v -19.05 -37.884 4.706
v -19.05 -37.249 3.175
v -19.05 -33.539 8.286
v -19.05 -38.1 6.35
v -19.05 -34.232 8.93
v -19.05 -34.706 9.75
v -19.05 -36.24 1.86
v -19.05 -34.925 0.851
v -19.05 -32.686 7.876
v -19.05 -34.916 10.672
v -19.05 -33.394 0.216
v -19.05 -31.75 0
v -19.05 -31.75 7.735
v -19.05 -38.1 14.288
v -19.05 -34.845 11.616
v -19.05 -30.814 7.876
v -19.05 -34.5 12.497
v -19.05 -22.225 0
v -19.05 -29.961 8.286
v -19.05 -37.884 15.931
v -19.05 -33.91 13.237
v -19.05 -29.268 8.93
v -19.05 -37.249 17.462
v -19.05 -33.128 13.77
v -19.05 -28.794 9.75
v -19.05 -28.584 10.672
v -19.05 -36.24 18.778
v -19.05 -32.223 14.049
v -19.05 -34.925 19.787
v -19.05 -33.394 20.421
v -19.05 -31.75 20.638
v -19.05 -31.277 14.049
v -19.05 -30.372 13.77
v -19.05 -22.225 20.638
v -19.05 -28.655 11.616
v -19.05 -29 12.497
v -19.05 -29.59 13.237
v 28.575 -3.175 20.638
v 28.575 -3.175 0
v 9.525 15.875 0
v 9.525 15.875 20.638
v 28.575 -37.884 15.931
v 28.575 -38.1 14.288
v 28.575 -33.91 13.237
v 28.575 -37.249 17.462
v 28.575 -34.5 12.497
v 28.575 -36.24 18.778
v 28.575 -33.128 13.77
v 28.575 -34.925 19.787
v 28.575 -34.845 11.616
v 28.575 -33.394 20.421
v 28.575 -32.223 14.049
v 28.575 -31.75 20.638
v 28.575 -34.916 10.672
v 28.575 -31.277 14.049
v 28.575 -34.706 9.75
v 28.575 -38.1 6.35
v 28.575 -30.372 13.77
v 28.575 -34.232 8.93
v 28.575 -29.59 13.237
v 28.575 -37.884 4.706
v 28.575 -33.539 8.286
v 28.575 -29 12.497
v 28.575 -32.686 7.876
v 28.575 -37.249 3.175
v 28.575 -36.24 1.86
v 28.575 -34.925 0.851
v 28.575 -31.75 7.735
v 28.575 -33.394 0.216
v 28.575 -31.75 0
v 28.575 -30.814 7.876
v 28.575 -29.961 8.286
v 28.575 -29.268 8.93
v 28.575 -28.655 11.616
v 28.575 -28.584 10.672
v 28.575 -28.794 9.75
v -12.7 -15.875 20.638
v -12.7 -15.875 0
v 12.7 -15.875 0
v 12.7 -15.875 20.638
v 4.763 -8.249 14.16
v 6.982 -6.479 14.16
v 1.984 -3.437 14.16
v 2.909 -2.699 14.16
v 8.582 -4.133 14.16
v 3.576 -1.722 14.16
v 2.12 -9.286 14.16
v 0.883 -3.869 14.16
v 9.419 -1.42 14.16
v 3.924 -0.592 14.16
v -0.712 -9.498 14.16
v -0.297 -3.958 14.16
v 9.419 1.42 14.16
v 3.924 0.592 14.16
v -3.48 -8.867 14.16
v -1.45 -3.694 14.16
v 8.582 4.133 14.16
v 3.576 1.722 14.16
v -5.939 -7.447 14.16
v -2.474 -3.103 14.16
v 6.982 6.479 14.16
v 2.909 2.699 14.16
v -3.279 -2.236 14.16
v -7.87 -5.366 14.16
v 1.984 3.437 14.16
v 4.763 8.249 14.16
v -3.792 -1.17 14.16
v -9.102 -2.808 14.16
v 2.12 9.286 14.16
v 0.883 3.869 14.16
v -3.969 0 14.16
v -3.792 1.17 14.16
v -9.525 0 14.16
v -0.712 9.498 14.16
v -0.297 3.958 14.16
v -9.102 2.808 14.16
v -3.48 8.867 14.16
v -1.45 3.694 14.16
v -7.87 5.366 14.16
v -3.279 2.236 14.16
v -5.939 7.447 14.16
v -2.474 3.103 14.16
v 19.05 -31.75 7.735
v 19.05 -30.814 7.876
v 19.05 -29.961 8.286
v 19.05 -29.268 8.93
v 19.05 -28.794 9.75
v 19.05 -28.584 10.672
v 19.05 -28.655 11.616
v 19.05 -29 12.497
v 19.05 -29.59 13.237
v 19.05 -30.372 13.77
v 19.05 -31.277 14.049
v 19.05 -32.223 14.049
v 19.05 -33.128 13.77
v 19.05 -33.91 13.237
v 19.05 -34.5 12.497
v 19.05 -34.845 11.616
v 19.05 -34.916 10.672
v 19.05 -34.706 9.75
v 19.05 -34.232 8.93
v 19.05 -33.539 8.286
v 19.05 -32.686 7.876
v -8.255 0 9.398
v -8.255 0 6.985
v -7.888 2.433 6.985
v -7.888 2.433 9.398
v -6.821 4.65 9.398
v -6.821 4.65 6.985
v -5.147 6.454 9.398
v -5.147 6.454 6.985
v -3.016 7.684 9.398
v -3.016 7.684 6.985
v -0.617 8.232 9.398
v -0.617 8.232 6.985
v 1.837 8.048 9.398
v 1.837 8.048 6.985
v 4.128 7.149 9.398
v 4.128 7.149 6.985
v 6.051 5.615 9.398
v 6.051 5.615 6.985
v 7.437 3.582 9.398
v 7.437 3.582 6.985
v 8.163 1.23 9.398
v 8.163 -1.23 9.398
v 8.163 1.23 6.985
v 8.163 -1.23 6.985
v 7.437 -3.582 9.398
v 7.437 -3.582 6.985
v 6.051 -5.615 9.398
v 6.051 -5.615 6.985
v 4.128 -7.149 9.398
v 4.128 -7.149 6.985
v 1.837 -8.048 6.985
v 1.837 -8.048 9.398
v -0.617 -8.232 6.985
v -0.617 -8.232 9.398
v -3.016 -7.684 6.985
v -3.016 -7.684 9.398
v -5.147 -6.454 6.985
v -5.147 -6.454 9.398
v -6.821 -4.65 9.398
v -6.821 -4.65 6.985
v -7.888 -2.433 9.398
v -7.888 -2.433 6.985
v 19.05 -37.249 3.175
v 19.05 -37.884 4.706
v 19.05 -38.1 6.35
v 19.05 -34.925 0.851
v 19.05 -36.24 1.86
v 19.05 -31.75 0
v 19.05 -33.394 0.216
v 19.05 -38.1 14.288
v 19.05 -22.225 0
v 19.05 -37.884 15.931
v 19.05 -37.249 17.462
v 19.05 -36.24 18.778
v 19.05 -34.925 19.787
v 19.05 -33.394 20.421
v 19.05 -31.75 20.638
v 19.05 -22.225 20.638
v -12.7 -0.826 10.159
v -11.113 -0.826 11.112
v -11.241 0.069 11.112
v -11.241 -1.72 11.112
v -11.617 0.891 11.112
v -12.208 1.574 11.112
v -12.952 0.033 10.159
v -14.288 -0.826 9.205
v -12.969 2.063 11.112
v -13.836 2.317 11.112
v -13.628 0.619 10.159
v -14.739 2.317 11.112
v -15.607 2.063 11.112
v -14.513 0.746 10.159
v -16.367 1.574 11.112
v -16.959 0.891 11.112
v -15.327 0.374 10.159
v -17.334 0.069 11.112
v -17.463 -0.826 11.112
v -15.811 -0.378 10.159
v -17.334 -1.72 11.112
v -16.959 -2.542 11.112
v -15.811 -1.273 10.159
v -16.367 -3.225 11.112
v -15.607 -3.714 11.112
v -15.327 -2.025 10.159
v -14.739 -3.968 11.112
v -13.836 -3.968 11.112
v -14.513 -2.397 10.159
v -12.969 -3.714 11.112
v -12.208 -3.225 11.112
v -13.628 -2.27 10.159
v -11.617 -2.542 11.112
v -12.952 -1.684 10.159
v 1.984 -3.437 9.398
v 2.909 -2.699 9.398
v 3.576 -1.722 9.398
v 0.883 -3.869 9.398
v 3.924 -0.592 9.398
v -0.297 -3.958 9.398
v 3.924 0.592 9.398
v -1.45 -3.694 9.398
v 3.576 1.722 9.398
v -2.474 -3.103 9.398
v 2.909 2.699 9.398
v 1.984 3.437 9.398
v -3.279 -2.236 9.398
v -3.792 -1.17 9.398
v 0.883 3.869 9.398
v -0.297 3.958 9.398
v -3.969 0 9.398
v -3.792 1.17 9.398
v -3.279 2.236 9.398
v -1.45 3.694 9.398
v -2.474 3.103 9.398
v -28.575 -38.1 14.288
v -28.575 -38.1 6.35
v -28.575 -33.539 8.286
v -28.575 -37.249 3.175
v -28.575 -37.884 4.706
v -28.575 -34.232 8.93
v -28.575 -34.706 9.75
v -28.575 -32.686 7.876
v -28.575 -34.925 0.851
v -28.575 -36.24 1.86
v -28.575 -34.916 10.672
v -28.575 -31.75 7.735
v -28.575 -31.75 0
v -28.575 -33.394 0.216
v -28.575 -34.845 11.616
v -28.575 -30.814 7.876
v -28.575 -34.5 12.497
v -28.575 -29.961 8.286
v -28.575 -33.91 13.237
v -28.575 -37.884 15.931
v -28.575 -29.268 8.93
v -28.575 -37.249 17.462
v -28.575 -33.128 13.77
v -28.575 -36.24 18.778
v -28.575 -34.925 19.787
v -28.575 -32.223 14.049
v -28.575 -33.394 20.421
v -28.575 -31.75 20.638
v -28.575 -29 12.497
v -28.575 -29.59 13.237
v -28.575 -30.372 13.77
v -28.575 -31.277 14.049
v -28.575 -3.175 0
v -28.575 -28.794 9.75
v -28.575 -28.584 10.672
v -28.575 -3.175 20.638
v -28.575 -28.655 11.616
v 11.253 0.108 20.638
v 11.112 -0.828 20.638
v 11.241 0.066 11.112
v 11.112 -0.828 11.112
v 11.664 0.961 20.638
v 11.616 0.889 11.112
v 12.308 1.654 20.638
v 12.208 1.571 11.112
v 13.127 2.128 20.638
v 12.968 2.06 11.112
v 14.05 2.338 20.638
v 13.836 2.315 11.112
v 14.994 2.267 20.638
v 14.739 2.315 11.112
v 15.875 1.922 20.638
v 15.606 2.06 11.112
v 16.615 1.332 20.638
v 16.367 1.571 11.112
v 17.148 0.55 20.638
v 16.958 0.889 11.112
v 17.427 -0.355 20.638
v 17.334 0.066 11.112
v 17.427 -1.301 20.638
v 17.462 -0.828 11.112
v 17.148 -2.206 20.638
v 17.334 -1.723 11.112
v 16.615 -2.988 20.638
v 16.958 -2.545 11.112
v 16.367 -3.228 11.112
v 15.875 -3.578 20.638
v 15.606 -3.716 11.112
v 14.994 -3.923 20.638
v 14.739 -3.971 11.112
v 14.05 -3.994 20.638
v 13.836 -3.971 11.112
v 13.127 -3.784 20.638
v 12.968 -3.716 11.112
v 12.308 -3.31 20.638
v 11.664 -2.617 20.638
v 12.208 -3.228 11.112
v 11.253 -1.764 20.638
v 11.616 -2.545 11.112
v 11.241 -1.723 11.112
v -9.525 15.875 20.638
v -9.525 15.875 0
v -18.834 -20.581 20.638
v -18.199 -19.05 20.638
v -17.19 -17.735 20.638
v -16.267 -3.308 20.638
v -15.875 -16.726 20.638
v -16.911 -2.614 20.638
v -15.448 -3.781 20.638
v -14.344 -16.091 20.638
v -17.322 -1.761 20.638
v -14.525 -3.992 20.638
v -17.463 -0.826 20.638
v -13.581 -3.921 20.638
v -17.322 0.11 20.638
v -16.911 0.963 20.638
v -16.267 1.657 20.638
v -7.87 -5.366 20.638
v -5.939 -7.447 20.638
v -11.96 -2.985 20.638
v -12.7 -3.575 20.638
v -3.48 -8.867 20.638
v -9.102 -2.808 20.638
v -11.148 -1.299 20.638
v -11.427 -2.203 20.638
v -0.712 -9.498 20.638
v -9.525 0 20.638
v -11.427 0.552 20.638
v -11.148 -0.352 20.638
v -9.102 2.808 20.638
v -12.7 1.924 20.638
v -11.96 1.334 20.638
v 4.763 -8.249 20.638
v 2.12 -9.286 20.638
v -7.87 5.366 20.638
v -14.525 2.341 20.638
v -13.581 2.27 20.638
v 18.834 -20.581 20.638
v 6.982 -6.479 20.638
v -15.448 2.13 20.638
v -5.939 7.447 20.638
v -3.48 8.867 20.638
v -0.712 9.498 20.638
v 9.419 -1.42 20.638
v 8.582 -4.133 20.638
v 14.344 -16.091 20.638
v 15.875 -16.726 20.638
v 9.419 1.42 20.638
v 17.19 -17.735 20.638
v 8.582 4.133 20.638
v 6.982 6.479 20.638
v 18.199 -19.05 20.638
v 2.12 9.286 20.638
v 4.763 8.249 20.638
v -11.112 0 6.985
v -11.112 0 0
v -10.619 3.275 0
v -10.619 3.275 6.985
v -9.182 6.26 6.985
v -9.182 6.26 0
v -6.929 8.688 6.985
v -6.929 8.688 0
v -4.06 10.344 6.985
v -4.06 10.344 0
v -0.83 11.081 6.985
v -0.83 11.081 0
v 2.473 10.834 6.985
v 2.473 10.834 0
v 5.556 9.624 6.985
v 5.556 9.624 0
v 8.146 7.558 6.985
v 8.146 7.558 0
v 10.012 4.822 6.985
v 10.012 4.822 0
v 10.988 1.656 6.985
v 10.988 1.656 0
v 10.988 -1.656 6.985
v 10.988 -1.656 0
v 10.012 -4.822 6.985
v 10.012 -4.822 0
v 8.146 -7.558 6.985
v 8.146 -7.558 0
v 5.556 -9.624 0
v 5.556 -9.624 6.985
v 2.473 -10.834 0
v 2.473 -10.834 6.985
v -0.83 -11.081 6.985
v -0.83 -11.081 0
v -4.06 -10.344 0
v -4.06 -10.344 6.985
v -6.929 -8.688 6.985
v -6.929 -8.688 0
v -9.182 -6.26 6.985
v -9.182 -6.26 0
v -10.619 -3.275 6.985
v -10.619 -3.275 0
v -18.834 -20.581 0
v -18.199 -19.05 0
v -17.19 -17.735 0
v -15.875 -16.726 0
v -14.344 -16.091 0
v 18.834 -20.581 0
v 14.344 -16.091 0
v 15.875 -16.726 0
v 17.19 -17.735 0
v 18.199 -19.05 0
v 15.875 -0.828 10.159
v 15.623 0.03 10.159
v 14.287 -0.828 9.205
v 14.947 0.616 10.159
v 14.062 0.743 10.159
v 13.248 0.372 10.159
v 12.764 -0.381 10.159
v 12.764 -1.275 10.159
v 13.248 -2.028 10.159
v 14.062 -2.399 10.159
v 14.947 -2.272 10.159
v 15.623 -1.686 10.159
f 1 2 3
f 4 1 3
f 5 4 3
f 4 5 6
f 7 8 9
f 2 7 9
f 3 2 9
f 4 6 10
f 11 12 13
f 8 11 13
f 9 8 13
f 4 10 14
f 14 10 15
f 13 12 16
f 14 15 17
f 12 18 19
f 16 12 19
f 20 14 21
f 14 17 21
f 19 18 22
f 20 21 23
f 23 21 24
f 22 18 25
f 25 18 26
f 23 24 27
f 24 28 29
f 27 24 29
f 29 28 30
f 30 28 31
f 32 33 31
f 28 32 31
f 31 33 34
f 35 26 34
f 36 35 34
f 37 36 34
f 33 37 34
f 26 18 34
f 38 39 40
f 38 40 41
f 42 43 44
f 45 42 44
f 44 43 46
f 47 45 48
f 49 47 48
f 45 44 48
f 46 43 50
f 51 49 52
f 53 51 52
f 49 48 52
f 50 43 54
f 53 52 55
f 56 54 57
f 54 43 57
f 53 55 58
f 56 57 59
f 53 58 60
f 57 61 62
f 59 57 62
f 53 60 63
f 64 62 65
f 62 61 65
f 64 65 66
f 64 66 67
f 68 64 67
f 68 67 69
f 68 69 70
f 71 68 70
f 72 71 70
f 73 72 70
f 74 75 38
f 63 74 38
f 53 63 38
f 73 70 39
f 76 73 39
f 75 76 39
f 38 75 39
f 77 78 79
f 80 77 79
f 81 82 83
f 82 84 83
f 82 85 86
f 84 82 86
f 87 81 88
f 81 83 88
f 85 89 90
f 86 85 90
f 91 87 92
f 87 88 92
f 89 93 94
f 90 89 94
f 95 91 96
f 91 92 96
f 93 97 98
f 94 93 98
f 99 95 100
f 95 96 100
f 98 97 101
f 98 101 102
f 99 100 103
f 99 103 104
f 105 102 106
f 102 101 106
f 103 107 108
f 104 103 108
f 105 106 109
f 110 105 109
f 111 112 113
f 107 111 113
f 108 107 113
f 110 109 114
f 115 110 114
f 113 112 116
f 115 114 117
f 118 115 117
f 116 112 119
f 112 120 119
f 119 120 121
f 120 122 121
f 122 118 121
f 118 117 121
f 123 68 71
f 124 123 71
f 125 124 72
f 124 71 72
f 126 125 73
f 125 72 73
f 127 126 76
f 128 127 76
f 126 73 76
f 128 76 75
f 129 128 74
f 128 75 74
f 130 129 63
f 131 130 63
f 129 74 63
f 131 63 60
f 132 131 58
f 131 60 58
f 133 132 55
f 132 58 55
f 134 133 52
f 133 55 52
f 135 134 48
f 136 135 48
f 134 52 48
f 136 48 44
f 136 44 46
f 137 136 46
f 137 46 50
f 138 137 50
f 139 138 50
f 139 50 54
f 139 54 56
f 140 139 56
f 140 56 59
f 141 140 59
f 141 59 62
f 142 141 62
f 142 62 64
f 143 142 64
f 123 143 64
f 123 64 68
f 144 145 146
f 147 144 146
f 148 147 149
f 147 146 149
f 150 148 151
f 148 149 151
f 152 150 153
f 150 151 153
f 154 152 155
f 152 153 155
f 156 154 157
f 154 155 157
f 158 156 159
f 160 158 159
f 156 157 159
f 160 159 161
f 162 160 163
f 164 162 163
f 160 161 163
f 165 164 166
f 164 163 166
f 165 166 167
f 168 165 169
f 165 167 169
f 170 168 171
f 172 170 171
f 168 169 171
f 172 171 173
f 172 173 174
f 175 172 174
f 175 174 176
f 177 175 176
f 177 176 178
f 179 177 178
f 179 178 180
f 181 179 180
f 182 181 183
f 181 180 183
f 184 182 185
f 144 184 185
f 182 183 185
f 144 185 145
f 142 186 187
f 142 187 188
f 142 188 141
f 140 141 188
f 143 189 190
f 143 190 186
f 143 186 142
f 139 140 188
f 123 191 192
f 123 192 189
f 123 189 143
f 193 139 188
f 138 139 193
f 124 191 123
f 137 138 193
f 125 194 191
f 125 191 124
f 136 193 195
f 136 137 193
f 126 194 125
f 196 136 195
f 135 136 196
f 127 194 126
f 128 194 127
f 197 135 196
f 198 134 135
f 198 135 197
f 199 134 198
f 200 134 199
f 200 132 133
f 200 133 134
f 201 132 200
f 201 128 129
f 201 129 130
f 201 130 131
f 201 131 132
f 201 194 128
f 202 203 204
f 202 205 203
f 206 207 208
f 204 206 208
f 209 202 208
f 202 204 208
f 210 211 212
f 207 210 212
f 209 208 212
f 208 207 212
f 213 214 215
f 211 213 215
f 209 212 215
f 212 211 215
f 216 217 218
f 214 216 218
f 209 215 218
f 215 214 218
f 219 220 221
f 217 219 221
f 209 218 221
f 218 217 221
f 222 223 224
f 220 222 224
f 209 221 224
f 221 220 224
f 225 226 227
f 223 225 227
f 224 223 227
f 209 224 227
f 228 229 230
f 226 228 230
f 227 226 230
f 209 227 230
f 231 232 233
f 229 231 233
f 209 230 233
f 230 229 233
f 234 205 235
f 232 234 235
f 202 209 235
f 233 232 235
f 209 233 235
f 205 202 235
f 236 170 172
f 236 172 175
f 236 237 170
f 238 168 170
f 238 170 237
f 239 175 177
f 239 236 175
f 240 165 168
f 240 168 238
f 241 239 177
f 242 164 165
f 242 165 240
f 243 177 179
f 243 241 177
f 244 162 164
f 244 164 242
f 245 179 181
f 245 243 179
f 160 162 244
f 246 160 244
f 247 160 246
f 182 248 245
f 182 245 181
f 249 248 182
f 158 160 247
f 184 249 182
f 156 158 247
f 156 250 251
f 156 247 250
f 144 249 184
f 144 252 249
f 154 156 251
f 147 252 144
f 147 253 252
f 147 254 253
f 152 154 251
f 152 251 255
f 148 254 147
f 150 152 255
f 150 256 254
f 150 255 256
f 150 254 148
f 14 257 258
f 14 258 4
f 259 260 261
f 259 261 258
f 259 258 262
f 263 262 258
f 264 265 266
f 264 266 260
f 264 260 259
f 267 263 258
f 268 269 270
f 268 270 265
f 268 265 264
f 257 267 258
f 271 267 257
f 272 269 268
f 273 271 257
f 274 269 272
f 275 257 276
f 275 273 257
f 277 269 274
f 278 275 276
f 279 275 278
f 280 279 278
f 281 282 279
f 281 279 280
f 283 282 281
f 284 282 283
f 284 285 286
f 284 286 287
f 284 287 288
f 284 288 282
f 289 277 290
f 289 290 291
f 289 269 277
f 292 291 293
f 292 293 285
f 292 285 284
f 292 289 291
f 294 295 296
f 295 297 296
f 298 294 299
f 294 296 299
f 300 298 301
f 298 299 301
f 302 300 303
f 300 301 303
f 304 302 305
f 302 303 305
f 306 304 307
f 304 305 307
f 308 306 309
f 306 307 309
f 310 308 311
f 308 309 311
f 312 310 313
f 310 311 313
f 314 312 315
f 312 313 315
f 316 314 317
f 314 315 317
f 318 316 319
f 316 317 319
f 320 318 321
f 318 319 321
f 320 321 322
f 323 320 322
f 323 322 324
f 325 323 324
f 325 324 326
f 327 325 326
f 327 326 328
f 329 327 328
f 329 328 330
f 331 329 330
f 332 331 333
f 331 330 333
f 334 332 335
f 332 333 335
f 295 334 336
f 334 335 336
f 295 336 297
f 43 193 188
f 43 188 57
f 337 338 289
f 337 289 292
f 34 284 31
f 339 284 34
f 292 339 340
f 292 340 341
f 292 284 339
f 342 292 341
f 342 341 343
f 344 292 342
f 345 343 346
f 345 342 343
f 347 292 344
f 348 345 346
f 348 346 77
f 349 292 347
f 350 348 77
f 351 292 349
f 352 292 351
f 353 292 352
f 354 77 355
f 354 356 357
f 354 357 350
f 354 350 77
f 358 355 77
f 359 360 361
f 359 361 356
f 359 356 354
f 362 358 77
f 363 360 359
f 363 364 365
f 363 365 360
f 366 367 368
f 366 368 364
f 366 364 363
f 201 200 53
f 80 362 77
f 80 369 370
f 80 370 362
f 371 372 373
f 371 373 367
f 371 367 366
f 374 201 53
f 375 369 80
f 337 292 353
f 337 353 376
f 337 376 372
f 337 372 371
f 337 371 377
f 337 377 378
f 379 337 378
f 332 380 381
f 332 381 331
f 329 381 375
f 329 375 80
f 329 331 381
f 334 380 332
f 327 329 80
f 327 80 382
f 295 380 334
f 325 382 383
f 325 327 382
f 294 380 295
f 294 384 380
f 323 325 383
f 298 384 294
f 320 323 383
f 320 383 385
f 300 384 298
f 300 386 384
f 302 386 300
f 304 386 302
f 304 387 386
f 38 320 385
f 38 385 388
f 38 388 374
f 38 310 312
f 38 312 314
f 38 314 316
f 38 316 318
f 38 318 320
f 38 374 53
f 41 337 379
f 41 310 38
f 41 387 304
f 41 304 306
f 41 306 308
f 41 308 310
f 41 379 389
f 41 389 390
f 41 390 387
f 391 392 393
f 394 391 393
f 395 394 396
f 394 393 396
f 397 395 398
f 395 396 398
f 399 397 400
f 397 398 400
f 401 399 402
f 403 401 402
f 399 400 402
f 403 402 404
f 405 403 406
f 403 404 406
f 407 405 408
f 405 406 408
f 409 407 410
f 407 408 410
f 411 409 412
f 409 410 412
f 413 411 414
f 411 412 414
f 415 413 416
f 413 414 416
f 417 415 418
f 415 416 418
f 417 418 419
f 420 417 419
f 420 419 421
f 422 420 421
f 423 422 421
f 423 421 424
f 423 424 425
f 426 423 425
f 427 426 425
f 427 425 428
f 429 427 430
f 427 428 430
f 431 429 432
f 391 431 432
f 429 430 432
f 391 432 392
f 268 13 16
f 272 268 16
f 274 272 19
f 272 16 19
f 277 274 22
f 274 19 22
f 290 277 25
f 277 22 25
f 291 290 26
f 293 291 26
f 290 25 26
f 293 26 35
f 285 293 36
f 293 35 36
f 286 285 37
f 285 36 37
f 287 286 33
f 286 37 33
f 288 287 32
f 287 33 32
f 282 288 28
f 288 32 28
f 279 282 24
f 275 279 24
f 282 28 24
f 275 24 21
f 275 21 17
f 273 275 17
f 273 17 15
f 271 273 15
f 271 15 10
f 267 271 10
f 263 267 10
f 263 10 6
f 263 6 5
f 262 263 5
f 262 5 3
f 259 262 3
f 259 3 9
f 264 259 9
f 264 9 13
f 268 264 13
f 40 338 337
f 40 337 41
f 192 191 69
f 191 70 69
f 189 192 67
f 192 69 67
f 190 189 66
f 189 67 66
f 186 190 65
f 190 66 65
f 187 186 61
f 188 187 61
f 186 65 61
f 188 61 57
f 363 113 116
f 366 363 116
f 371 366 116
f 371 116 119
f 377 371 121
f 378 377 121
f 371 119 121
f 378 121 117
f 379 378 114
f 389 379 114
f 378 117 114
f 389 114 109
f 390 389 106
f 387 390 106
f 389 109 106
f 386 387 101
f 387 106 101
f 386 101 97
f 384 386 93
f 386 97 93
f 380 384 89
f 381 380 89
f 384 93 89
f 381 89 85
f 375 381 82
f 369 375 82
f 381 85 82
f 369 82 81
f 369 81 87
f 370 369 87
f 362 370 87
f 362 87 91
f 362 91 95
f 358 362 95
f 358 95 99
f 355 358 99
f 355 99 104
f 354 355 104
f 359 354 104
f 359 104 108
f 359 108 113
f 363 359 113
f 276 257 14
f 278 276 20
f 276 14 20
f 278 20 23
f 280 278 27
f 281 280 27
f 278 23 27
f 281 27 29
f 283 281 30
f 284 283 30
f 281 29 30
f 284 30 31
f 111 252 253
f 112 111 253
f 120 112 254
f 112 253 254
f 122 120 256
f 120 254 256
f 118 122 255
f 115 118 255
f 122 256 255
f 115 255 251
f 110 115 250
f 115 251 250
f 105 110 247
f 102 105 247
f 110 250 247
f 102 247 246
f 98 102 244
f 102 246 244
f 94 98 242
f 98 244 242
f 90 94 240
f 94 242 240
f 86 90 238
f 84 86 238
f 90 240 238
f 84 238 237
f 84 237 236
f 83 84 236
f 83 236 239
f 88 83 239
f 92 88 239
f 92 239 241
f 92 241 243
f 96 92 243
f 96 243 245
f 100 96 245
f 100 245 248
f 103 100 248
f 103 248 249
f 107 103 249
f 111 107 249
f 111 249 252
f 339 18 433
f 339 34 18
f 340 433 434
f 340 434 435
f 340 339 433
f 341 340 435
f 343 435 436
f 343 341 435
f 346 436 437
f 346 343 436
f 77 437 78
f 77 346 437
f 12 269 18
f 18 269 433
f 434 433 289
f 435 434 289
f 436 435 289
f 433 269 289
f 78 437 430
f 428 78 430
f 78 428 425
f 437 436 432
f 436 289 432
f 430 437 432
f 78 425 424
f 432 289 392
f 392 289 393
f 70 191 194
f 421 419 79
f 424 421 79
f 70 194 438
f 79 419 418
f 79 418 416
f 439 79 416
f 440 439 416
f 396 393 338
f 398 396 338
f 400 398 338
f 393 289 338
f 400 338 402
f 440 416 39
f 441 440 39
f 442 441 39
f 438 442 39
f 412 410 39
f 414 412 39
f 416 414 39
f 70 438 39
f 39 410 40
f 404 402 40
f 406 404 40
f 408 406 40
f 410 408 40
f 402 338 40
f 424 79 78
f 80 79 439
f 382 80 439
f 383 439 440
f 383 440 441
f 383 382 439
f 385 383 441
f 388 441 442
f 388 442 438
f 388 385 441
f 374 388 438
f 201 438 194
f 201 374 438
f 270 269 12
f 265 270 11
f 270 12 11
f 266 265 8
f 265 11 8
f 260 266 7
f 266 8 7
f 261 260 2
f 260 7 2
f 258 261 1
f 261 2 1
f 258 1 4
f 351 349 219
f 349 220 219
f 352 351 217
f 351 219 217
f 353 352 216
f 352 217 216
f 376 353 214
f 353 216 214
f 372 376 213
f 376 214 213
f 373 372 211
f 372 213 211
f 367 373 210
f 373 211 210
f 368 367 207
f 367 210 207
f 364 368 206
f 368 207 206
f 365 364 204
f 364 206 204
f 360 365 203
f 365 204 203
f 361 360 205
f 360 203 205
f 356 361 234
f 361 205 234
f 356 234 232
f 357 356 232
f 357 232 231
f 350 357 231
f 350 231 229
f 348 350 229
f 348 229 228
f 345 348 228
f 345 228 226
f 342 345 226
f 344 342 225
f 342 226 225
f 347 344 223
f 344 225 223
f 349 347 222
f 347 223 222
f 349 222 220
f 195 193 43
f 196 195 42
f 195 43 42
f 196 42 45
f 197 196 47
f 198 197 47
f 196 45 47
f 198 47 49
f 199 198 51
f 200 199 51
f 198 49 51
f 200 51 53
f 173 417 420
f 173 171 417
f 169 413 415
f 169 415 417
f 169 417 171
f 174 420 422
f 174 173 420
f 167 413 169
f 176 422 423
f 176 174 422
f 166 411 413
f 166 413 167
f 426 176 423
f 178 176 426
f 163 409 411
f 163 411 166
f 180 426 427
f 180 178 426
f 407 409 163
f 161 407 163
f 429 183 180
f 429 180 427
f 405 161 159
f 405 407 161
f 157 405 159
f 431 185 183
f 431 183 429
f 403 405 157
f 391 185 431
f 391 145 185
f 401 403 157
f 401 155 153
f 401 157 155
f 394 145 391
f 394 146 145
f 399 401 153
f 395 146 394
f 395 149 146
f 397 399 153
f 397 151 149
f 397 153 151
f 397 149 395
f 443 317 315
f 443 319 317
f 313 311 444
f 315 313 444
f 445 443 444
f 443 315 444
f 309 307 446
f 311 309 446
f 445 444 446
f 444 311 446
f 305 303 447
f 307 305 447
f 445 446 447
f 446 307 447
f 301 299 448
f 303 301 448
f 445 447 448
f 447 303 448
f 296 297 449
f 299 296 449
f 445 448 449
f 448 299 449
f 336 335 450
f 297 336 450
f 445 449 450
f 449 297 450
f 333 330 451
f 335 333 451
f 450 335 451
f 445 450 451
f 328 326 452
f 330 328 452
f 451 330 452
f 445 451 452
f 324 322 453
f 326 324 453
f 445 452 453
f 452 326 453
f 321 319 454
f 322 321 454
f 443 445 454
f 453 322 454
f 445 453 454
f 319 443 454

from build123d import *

# Parameters (mm, degrees)
SKETCH1_W                      = 57.15
SKETCH1_H                      = 31.75
BOSS_EXTRUDE1_DEPTH            = 20.6375
SKETCH2_R                      = 11.1125
CUT_EXTRUDE1_DEPTH             = 6.985
SKETCH3_R                      = 8.255
CUT_EXTRUDE2_DEPTH             = 2.413
SKETCH4_R                      = 3.96875
CUT_EXTRUDE3_DEPTH             = 35.56692943
CUT_EXTRUDE4_START             = -4.7625
SKETCH6_R                      = 9.525
CUT_EXTRUDE4_DEPTH             = 30.80442943
SKETCH7_W                      = 9.525
SKETCH7_H                      = 20.6375
BOSS_EXTRUDE2_DEPTH            = 22.225
SKETCH9_R                      = 3.175
CUT_EXTRUDE5_DEPTH             = 72.719166938
FILLET1_R                      = 6.35
F_1_4_0_2500_DOWEL_HOLE1_D     = 6.35
F_1_4_0_2500_DOWEL_HOLE1_DEPTH = 9.525
F_1_4_0_2500_DOWEL_HOLE1_TIP   = 1.907732465
FILLET3_R                      = 6.35
CHAMFER1_SIZE                  = 19.05


with BuildPart() as part:
    # Sketch1 → Boss-Extrude1 (new body)
    with BuildSketch(Plane.XY):
        Rectangle(SKETCH1_W, SKETCH1_H)
    extrude(amount=BOSS_EXTRUDE1_DEPTH)

    # Sketch2 → Cut-Extrude1 (cut)
    with BuildSketch(Plane(origin=(0, 0, 0), x_dir=(-1, 0, 0), z_dir=(0, 0, -1))):
        Circle(SKETCH2_R)
    extrude(amount=-CUT_EXTRUDE1_DEPTH, mode=Mode.SUBTRACT)

    # Sketch3 → Cut-Extrude2 (cut)
    with BuildSketch(Plane(origin=(0, 0, 6.985), x_dir=(-1, 0, 0), z_dir=(0, 0, -1))):
        Circle(SKETCH3_R)
    extrude(amount=-CUT_EXTRUDE2_DEPTH, mode=Mode.SUBTRACT)

    # Sketch4 → Cut-Extrude3 (cut, through all)
    with BuildSketch(Plane(origin=(0, 0, 9.398), x_dir=(-1, 0, 0), z_dir=(0, 0, -1))):
        Circle(SKETCH4_R)
    extrude(amount=-CUT_EXTRUDE3_DEPTH, mode=Mode.SUBTRACT)

    # Sketch6 → Cut-Extrude4 (cut, through all)
    with BuildSketch(Plane(origin=(0, 0, 9.398), x_dir=(-1, 0, 0), z_dir=(0, 0, -1)).offset(CUT_EXTRUDE4_START)):
        Circle(SKETCH6_R)
    extrude(amount=-CUT_EXTRUDE4_DEPTH, mode=Mode.SUBTRACT)

    # Sketch7 → Boss-Extrude2 (add)
    with BuildSketch(Plane.XZ.offset(15.875)):
        with Locations((-23.8125, 10.31875)):
            Rectangle(SKETCH7_W, SKETCH7_H)
        with Locations((23.8125, 10.31875)):
            Rectangle(SKETCH7_W, SKETCH7_H)
    extrude(amount=BOSS_EXTRUDE2_DEPTH)

    # Sketch9 → Cut-Extrude5 (cut, through all)
    with BuildSketch(Plane(origin=(28.575, 0, 0), x_dir=(0, 0, -1), z_dir=(1, 0, 0))):
        with Locations((-10.909520599, -31.75)):
            Circle(SKETCH9_R)
    extrude(amount=-CUT_EXTRUDE5_DEPTH, mode=Mode.SUBTRACT)

    # Fillet1
    fillet1_edges = [part.edges().sort_by_distance(p)[0] for p in [
        (-19.05, -15.875, 10.31875),
        (19.05, -15.875, 10.31875),
    ]]
    fillet(fillet1_edges, radius=FILLET1_R)

    # 1/4 (0.2500) Dowel Hole1
    with Locations(Plane.XY.offset(20.6375)):
        with Locations((-14.287572867, -0.8255), (14.287427022, -0.828020391)):
            Hole(F_1_4_0_2500_DOWEL_HOLE1_D / 2, depth=F_1_4_0_2500_DOWEL_HOLE1_DEPTH)
            with Locations((0, 0, -(F_1_4_0_2500_DOWEL_HOLE1_DEPTH + F_1_4_0_2500_DOWEL_HOLE1_TIP / 2))):  # 118° drill point
                Cone(0, F_1_4_0_2500_DOWEL_HOLE1_D / 2, F_1_4_0_2500_DOWEL_HOLE1_TIP, mode=Mode.SUBTRACT)

    # Fillet3
    fillet3_edges = [part.edges().sort_by_distance(p)[0] for p in [
        (-23.8125, -38.1, 0),
        (-23.8125, -38.1, 20.6375),
        (23.8125, -38.1, 20.6375),
        (23.8125, -38.1, 0),
    ]]
    fillet(fillet3_edges, radius=FILLET3_R)

    # Chamfer1
    chamfer1_edges = [part.edges().sort_by_distance(p)[0] for p in [
        (-28.575, 15.875, 10.31875),
        (28.575, 15.875, 10.31875),
    ]]
    chamfer(chamfer1_edges, length=CHAMFER1_SIZE)


solid = part.part
